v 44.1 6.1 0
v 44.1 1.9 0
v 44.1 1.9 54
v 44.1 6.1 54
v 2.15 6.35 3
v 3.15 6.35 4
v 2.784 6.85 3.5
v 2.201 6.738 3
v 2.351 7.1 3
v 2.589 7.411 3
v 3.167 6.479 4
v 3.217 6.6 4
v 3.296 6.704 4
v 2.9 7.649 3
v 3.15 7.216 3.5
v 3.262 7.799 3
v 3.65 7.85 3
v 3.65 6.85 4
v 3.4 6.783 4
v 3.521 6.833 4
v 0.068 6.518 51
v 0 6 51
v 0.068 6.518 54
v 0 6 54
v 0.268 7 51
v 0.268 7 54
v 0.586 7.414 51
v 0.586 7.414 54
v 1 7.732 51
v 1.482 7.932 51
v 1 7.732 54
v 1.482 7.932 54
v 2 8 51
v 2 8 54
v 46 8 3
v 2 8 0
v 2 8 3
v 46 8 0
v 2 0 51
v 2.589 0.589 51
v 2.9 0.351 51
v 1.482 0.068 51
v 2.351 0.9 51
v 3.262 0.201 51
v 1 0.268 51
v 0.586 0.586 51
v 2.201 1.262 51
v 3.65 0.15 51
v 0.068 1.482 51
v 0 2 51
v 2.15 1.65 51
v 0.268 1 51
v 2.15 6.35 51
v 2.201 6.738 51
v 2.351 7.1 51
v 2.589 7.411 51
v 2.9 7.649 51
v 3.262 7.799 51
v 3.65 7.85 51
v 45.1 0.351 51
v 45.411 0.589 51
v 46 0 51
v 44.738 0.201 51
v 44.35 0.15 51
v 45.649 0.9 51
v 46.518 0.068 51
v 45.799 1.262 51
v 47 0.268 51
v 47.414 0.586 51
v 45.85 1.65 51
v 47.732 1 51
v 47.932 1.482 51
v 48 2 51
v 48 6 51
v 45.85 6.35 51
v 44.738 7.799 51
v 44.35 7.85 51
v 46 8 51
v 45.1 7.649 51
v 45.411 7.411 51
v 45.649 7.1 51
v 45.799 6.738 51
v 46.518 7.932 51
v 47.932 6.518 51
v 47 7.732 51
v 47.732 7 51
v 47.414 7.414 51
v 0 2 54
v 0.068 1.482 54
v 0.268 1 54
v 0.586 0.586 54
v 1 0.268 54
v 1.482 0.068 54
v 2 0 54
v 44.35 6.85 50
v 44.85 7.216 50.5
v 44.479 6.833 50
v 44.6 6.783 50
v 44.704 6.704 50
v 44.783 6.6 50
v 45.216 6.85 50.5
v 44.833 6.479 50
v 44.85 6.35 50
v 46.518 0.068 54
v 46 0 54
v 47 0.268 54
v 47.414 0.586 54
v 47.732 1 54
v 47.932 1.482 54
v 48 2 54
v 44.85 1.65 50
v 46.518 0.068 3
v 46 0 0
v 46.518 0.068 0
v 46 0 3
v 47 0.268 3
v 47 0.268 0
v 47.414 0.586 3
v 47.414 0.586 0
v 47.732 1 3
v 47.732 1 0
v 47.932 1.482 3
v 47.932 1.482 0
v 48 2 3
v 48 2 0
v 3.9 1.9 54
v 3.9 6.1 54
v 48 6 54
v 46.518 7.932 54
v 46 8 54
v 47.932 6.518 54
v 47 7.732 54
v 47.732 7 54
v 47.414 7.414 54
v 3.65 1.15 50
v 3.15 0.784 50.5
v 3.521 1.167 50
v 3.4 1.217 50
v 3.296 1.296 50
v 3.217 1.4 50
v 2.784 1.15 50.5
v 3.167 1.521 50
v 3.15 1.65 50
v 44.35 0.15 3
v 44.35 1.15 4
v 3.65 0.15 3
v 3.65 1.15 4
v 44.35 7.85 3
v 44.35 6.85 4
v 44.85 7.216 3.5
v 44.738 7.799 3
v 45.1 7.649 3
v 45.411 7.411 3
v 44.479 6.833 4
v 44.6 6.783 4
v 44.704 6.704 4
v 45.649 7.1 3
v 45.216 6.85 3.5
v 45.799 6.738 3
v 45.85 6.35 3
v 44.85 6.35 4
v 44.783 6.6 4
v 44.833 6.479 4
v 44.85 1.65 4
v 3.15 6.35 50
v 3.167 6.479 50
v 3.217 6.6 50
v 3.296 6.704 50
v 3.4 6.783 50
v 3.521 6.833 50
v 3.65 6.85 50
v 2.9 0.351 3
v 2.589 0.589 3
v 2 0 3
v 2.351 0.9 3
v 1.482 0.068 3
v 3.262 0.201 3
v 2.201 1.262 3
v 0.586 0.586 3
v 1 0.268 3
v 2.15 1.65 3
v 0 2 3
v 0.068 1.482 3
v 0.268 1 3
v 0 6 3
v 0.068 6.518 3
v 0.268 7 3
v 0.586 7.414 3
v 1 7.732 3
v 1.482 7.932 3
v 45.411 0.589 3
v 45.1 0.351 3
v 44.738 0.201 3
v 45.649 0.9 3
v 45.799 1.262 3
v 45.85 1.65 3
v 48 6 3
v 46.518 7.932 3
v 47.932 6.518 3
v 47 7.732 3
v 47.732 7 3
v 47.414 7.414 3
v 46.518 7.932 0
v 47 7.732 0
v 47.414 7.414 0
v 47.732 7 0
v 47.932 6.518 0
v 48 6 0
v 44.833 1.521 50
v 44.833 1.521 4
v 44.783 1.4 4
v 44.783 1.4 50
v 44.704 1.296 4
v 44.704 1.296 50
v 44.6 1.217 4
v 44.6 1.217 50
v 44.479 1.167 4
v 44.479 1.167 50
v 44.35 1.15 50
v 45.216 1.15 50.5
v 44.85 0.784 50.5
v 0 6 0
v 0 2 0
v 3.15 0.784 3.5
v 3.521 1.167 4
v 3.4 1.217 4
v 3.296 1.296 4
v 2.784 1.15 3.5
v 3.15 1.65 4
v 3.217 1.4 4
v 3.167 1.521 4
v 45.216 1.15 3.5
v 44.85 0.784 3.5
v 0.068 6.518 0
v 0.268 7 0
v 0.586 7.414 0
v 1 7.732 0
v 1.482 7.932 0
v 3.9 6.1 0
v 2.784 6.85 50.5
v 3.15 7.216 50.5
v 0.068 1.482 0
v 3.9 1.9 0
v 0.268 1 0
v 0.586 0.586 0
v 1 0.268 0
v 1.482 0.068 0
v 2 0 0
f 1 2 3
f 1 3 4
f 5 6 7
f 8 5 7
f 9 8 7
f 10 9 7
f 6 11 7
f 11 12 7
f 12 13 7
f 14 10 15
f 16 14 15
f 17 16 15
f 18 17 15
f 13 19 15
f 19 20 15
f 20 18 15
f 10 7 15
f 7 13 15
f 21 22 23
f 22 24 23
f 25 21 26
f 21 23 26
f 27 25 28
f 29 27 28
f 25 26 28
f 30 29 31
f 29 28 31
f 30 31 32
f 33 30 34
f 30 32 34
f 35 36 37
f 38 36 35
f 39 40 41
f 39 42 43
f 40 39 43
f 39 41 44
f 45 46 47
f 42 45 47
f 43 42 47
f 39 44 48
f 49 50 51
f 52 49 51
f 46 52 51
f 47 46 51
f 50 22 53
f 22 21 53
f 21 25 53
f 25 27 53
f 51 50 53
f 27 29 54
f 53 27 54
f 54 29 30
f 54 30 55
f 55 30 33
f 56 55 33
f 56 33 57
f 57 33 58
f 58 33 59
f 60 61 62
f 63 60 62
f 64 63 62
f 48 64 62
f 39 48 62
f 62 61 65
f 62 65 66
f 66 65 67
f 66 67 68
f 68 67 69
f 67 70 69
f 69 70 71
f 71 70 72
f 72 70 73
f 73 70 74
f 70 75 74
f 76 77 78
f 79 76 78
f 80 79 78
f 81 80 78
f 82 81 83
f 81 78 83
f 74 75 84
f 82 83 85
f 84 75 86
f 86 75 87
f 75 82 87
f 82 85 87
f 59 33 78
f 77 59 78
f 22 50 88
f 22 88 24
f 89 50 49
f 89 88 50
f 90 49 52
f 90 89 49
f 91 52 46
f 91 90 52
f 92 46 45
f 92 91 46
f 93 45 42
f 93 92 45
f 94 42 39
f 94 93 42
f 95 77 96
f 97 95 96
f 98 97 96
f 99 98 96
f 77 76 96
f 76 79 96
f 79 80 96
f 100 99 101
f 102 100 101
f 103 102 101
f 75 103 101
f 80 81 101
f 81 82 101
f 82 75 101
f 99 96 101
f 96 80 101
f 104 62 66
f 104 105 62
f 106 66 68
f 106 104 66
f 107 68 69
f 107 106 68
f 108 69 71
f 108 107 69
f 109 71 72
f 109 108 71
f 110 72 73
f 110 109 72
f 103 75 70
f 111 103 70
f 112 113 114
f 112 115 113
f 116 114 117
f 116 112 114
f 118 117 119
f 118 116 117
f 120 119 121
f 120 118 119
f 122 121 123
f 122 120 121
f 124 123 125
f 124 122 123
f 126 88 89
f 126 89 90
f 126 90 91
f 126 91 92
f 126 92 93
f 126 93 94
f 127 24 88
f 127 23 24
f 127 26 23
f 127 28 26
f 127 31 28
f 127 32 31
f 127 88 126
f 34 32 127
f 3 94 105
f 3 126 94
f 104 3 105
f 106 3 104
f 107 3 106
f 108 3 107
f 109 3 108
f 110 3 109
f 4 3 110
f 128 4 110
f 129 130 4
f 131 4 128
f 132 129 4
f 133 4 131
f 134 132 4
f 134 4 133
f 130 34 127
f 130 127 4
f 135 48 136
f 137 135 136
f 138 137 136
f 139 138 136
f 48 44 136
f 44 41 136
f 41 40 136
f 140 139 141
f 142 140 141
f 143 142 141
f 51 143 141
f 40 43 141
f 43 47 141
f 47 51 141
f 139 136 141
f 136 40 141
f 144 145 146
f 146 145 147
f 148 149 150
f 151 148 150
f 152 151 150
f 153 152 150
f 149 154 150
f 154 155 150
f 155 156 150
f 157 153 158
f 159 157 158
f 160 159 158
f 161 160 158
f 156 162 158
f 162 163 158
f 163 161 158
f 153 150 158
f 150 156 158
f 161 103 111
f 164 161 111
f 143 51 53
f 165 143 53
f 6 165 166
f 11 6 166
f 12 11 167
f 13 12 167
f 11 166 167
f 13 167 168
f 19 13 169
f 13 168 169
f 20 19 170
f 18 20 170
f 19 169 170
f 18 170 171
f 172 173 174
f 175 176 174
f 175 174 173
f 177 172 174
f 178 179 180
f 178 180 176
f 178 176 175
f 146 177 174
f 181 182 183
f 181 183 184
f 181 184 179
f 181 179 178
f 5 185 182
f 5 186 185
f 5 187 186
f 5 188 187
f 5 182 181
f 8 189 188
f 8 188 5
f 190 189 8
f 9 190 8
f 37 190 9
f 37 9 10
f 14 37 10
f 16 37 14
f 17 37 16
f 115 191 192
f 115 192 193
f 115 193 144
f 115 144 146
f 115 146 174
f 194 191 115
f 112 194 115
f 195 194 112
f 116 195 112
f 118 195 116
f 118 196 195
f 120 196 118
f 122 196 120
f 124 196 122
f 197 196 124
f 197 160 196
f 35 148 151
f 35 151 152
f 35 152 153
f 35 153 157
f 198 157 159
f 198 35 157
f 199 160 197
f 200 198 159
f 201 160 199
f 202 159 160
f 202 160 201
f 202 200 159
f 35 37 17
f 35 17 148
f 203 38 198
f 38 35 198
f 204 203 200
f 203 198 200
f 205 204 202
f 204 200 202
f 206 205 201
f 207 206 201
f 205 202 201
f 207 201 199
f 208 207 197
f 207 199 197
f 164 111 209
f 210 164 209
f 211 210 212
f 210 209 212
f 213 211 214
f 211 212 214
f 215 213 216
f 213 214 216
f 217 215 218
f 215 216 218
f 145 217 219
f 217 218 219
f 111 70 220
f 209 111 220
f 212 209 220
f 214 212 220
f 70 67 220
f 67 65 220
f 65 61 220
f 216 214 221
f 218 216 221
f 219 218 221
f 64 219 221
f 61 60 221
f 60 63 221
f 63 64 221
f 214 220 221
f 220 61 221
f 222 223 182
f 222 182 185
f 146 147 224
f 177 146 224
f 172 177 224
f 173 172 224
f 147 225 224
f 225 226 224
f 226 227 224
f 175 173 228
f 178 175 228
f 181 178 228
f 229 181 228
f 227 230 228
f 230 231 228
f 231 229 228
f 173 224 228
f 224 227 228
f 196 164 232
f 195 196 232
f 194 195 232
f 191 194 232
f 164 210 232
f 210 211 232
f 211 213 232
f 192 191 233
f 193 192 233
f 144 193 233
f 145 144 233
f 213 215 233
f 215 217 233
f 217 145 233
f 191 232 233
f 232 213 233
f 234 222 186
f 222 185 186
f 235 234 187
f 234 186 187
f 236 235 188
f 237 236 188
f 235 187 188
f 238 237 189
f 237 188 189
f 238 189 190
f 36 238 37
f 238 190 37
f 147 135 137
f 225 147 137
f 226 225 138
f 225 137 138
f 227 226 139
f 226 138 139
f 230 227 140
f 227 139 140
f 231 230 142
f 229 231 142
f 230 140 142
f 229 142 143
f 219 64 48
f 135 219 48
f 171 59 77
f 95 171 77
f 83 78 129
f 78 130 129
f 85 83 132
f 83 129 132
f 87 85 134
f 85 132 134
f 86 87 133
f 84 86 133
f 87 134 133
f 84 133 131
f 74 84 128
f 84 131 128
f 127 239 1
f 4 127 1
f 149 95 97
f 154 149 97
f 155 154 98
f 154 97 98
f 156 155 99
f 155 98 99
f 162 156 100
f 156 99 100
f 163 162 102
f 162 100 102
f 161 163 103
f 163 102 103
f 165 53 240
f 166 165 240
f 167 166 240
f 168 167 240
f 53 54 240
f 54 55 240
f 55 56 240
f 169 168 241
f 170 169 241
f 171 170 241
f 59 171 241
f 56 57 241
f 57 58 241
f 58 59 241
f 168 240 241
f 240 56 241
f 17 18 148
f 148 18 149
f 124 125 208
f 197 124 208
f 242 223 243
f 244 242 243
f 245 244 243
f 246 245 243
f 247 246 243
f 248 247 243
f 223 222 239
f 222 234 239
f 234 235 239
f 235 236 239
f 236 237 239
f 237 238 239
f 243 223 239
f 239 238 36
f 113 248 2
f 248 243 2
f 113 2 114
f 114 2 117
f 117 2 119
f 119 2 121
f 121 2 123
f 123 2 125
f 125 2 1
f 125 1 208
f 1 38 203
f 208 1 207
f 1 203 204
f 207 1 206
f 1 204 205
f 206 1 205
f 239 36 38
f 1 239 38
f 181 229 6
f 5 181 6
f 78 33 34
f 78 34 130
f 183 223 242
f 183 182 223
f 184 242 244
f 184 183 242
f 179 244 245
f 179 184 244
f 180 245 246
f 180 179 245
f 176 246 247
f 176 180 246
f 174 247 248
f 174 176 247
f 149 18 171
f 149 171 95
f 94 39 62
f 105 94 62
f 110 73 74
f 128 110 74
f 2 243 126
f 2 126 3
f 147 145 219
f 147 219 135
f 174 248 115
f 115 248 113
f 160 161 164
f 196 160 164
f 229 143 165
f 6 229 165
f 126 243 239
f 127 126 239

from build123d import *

# Parameters (mm, degrees)
SKETCH1_W           = 48
SKETCH1_H           = 8
SKETCH1_W_2         = 40.2
SKETCH1_H_2         = 4.2
BOSS_EXTRUDE1_DEPTH = 54
CUT_EXTRUDE1_START  = -3
SKETCH2_OUTSIDE_W   = 64.538
SKETCH2_OUTSIDE_H   = 24.538
CUT_EXTRUDE1_DEPTH  = 48
FILLET1_R           = 2
CHAMFER1_SIZE       = 1


with BuildPart() as part:
    # Sketch1 → Boss-Extrude1 (new body)
    with BuildSketch(Plane.XY):
        with Locations((24, 4)):
            Rectangle(SKETCH1_W, SKETCH1_H)
        with Locations((24, 4)):
            Rectangle(SKETCH1_W_2, SKETCH1_H_2, mode=Mode.SUBTRACT)
    extrude(amount=BOSS_EXTRUDE1_DEPTH)

    # Sketch2 outside → Cut-Extrude1 (cut)
    with BuildSketch(Plane.XY.offset(54).offset(CUT_EXTRUDE1_START)):
        with Locations((24, 4)):
            Rectangle(SKETCH2_OUTSIDE_W, SKETCH2_OUTSIDE_H)
        with BuildLine():
            Line((3.65, 6.85), (44.35, 6.85))
            ThreePointArc((44.35, 6.85), (44.703553391, 6.703553391), (44.85, 6.35))
            Line((44.85, 6.35), (44.85, 1.65))
            ThreePointArc((44.85, 1.65), (44.703553391, 1.296446609), (44.35, 1.15))
            Line((44.35, 1.15), (3.65, 1.15))
            ThreePointArc((3.65, 1.15), (3.296446609, 1.296446609), (3.15, 1.65))
            Line((3.15, 1.65), (3.15, 6.35))
            ThreePointArc((3.15, 6.35), (3.296446609, 6.703553391), (3.65, 6.85))
        make_face(mode=Mode.SUBTRACT)
    extrude(amount=-CUT_EXTRUDE1_DEPTH, mode=Mode.SUBTRACT)

    # Fillet1
    fillet1_edges = [part.edges().sort_by_distance(p)[0] for p in [
        (48, 0, 1.5),
        (0, 0, 1.5),
        (0, 8, 1.5),
        (48, 8, 1.5),
        (48, 0, 52.5),
        (0, 0, 52.5),
        (0, 8, 52.5),
        (48, 8, 52.5),
    ]]
    fillet(fillet1_edges, radius=FILLET1_R)

    # Chamfer1
    chamfer1_edges = [part.edges().sort_by_distance(p)[0] for p in [
        (3.15, 4, 3),
        (3.296446609, 1.296446609, 3),
        (24, 1.15, 3),
        (44.703553391, 1.296446609, 3),
        (44.85, 4, 3),
        (44.703553391, 6.703553391, 3),
        (24, 6.85, 3),
        (3.296446609, 6.703553391, 3),
        (3.296446609, 1.296446609, 51),
        (3.15, 4, 51),
        (3.296446609, 6.703553391, 51),
        (24, 6.85, 51),
        (44.703553391, 6.703553391, 51),
        (44.85, 4, 51),
        (44.703553391, 1.296446609, 51),
        (24, 1.15, 51),
    ]]
    chamfer(chamfer1_edges, length=CHAMFER1_SIZE)


solid = part.part
